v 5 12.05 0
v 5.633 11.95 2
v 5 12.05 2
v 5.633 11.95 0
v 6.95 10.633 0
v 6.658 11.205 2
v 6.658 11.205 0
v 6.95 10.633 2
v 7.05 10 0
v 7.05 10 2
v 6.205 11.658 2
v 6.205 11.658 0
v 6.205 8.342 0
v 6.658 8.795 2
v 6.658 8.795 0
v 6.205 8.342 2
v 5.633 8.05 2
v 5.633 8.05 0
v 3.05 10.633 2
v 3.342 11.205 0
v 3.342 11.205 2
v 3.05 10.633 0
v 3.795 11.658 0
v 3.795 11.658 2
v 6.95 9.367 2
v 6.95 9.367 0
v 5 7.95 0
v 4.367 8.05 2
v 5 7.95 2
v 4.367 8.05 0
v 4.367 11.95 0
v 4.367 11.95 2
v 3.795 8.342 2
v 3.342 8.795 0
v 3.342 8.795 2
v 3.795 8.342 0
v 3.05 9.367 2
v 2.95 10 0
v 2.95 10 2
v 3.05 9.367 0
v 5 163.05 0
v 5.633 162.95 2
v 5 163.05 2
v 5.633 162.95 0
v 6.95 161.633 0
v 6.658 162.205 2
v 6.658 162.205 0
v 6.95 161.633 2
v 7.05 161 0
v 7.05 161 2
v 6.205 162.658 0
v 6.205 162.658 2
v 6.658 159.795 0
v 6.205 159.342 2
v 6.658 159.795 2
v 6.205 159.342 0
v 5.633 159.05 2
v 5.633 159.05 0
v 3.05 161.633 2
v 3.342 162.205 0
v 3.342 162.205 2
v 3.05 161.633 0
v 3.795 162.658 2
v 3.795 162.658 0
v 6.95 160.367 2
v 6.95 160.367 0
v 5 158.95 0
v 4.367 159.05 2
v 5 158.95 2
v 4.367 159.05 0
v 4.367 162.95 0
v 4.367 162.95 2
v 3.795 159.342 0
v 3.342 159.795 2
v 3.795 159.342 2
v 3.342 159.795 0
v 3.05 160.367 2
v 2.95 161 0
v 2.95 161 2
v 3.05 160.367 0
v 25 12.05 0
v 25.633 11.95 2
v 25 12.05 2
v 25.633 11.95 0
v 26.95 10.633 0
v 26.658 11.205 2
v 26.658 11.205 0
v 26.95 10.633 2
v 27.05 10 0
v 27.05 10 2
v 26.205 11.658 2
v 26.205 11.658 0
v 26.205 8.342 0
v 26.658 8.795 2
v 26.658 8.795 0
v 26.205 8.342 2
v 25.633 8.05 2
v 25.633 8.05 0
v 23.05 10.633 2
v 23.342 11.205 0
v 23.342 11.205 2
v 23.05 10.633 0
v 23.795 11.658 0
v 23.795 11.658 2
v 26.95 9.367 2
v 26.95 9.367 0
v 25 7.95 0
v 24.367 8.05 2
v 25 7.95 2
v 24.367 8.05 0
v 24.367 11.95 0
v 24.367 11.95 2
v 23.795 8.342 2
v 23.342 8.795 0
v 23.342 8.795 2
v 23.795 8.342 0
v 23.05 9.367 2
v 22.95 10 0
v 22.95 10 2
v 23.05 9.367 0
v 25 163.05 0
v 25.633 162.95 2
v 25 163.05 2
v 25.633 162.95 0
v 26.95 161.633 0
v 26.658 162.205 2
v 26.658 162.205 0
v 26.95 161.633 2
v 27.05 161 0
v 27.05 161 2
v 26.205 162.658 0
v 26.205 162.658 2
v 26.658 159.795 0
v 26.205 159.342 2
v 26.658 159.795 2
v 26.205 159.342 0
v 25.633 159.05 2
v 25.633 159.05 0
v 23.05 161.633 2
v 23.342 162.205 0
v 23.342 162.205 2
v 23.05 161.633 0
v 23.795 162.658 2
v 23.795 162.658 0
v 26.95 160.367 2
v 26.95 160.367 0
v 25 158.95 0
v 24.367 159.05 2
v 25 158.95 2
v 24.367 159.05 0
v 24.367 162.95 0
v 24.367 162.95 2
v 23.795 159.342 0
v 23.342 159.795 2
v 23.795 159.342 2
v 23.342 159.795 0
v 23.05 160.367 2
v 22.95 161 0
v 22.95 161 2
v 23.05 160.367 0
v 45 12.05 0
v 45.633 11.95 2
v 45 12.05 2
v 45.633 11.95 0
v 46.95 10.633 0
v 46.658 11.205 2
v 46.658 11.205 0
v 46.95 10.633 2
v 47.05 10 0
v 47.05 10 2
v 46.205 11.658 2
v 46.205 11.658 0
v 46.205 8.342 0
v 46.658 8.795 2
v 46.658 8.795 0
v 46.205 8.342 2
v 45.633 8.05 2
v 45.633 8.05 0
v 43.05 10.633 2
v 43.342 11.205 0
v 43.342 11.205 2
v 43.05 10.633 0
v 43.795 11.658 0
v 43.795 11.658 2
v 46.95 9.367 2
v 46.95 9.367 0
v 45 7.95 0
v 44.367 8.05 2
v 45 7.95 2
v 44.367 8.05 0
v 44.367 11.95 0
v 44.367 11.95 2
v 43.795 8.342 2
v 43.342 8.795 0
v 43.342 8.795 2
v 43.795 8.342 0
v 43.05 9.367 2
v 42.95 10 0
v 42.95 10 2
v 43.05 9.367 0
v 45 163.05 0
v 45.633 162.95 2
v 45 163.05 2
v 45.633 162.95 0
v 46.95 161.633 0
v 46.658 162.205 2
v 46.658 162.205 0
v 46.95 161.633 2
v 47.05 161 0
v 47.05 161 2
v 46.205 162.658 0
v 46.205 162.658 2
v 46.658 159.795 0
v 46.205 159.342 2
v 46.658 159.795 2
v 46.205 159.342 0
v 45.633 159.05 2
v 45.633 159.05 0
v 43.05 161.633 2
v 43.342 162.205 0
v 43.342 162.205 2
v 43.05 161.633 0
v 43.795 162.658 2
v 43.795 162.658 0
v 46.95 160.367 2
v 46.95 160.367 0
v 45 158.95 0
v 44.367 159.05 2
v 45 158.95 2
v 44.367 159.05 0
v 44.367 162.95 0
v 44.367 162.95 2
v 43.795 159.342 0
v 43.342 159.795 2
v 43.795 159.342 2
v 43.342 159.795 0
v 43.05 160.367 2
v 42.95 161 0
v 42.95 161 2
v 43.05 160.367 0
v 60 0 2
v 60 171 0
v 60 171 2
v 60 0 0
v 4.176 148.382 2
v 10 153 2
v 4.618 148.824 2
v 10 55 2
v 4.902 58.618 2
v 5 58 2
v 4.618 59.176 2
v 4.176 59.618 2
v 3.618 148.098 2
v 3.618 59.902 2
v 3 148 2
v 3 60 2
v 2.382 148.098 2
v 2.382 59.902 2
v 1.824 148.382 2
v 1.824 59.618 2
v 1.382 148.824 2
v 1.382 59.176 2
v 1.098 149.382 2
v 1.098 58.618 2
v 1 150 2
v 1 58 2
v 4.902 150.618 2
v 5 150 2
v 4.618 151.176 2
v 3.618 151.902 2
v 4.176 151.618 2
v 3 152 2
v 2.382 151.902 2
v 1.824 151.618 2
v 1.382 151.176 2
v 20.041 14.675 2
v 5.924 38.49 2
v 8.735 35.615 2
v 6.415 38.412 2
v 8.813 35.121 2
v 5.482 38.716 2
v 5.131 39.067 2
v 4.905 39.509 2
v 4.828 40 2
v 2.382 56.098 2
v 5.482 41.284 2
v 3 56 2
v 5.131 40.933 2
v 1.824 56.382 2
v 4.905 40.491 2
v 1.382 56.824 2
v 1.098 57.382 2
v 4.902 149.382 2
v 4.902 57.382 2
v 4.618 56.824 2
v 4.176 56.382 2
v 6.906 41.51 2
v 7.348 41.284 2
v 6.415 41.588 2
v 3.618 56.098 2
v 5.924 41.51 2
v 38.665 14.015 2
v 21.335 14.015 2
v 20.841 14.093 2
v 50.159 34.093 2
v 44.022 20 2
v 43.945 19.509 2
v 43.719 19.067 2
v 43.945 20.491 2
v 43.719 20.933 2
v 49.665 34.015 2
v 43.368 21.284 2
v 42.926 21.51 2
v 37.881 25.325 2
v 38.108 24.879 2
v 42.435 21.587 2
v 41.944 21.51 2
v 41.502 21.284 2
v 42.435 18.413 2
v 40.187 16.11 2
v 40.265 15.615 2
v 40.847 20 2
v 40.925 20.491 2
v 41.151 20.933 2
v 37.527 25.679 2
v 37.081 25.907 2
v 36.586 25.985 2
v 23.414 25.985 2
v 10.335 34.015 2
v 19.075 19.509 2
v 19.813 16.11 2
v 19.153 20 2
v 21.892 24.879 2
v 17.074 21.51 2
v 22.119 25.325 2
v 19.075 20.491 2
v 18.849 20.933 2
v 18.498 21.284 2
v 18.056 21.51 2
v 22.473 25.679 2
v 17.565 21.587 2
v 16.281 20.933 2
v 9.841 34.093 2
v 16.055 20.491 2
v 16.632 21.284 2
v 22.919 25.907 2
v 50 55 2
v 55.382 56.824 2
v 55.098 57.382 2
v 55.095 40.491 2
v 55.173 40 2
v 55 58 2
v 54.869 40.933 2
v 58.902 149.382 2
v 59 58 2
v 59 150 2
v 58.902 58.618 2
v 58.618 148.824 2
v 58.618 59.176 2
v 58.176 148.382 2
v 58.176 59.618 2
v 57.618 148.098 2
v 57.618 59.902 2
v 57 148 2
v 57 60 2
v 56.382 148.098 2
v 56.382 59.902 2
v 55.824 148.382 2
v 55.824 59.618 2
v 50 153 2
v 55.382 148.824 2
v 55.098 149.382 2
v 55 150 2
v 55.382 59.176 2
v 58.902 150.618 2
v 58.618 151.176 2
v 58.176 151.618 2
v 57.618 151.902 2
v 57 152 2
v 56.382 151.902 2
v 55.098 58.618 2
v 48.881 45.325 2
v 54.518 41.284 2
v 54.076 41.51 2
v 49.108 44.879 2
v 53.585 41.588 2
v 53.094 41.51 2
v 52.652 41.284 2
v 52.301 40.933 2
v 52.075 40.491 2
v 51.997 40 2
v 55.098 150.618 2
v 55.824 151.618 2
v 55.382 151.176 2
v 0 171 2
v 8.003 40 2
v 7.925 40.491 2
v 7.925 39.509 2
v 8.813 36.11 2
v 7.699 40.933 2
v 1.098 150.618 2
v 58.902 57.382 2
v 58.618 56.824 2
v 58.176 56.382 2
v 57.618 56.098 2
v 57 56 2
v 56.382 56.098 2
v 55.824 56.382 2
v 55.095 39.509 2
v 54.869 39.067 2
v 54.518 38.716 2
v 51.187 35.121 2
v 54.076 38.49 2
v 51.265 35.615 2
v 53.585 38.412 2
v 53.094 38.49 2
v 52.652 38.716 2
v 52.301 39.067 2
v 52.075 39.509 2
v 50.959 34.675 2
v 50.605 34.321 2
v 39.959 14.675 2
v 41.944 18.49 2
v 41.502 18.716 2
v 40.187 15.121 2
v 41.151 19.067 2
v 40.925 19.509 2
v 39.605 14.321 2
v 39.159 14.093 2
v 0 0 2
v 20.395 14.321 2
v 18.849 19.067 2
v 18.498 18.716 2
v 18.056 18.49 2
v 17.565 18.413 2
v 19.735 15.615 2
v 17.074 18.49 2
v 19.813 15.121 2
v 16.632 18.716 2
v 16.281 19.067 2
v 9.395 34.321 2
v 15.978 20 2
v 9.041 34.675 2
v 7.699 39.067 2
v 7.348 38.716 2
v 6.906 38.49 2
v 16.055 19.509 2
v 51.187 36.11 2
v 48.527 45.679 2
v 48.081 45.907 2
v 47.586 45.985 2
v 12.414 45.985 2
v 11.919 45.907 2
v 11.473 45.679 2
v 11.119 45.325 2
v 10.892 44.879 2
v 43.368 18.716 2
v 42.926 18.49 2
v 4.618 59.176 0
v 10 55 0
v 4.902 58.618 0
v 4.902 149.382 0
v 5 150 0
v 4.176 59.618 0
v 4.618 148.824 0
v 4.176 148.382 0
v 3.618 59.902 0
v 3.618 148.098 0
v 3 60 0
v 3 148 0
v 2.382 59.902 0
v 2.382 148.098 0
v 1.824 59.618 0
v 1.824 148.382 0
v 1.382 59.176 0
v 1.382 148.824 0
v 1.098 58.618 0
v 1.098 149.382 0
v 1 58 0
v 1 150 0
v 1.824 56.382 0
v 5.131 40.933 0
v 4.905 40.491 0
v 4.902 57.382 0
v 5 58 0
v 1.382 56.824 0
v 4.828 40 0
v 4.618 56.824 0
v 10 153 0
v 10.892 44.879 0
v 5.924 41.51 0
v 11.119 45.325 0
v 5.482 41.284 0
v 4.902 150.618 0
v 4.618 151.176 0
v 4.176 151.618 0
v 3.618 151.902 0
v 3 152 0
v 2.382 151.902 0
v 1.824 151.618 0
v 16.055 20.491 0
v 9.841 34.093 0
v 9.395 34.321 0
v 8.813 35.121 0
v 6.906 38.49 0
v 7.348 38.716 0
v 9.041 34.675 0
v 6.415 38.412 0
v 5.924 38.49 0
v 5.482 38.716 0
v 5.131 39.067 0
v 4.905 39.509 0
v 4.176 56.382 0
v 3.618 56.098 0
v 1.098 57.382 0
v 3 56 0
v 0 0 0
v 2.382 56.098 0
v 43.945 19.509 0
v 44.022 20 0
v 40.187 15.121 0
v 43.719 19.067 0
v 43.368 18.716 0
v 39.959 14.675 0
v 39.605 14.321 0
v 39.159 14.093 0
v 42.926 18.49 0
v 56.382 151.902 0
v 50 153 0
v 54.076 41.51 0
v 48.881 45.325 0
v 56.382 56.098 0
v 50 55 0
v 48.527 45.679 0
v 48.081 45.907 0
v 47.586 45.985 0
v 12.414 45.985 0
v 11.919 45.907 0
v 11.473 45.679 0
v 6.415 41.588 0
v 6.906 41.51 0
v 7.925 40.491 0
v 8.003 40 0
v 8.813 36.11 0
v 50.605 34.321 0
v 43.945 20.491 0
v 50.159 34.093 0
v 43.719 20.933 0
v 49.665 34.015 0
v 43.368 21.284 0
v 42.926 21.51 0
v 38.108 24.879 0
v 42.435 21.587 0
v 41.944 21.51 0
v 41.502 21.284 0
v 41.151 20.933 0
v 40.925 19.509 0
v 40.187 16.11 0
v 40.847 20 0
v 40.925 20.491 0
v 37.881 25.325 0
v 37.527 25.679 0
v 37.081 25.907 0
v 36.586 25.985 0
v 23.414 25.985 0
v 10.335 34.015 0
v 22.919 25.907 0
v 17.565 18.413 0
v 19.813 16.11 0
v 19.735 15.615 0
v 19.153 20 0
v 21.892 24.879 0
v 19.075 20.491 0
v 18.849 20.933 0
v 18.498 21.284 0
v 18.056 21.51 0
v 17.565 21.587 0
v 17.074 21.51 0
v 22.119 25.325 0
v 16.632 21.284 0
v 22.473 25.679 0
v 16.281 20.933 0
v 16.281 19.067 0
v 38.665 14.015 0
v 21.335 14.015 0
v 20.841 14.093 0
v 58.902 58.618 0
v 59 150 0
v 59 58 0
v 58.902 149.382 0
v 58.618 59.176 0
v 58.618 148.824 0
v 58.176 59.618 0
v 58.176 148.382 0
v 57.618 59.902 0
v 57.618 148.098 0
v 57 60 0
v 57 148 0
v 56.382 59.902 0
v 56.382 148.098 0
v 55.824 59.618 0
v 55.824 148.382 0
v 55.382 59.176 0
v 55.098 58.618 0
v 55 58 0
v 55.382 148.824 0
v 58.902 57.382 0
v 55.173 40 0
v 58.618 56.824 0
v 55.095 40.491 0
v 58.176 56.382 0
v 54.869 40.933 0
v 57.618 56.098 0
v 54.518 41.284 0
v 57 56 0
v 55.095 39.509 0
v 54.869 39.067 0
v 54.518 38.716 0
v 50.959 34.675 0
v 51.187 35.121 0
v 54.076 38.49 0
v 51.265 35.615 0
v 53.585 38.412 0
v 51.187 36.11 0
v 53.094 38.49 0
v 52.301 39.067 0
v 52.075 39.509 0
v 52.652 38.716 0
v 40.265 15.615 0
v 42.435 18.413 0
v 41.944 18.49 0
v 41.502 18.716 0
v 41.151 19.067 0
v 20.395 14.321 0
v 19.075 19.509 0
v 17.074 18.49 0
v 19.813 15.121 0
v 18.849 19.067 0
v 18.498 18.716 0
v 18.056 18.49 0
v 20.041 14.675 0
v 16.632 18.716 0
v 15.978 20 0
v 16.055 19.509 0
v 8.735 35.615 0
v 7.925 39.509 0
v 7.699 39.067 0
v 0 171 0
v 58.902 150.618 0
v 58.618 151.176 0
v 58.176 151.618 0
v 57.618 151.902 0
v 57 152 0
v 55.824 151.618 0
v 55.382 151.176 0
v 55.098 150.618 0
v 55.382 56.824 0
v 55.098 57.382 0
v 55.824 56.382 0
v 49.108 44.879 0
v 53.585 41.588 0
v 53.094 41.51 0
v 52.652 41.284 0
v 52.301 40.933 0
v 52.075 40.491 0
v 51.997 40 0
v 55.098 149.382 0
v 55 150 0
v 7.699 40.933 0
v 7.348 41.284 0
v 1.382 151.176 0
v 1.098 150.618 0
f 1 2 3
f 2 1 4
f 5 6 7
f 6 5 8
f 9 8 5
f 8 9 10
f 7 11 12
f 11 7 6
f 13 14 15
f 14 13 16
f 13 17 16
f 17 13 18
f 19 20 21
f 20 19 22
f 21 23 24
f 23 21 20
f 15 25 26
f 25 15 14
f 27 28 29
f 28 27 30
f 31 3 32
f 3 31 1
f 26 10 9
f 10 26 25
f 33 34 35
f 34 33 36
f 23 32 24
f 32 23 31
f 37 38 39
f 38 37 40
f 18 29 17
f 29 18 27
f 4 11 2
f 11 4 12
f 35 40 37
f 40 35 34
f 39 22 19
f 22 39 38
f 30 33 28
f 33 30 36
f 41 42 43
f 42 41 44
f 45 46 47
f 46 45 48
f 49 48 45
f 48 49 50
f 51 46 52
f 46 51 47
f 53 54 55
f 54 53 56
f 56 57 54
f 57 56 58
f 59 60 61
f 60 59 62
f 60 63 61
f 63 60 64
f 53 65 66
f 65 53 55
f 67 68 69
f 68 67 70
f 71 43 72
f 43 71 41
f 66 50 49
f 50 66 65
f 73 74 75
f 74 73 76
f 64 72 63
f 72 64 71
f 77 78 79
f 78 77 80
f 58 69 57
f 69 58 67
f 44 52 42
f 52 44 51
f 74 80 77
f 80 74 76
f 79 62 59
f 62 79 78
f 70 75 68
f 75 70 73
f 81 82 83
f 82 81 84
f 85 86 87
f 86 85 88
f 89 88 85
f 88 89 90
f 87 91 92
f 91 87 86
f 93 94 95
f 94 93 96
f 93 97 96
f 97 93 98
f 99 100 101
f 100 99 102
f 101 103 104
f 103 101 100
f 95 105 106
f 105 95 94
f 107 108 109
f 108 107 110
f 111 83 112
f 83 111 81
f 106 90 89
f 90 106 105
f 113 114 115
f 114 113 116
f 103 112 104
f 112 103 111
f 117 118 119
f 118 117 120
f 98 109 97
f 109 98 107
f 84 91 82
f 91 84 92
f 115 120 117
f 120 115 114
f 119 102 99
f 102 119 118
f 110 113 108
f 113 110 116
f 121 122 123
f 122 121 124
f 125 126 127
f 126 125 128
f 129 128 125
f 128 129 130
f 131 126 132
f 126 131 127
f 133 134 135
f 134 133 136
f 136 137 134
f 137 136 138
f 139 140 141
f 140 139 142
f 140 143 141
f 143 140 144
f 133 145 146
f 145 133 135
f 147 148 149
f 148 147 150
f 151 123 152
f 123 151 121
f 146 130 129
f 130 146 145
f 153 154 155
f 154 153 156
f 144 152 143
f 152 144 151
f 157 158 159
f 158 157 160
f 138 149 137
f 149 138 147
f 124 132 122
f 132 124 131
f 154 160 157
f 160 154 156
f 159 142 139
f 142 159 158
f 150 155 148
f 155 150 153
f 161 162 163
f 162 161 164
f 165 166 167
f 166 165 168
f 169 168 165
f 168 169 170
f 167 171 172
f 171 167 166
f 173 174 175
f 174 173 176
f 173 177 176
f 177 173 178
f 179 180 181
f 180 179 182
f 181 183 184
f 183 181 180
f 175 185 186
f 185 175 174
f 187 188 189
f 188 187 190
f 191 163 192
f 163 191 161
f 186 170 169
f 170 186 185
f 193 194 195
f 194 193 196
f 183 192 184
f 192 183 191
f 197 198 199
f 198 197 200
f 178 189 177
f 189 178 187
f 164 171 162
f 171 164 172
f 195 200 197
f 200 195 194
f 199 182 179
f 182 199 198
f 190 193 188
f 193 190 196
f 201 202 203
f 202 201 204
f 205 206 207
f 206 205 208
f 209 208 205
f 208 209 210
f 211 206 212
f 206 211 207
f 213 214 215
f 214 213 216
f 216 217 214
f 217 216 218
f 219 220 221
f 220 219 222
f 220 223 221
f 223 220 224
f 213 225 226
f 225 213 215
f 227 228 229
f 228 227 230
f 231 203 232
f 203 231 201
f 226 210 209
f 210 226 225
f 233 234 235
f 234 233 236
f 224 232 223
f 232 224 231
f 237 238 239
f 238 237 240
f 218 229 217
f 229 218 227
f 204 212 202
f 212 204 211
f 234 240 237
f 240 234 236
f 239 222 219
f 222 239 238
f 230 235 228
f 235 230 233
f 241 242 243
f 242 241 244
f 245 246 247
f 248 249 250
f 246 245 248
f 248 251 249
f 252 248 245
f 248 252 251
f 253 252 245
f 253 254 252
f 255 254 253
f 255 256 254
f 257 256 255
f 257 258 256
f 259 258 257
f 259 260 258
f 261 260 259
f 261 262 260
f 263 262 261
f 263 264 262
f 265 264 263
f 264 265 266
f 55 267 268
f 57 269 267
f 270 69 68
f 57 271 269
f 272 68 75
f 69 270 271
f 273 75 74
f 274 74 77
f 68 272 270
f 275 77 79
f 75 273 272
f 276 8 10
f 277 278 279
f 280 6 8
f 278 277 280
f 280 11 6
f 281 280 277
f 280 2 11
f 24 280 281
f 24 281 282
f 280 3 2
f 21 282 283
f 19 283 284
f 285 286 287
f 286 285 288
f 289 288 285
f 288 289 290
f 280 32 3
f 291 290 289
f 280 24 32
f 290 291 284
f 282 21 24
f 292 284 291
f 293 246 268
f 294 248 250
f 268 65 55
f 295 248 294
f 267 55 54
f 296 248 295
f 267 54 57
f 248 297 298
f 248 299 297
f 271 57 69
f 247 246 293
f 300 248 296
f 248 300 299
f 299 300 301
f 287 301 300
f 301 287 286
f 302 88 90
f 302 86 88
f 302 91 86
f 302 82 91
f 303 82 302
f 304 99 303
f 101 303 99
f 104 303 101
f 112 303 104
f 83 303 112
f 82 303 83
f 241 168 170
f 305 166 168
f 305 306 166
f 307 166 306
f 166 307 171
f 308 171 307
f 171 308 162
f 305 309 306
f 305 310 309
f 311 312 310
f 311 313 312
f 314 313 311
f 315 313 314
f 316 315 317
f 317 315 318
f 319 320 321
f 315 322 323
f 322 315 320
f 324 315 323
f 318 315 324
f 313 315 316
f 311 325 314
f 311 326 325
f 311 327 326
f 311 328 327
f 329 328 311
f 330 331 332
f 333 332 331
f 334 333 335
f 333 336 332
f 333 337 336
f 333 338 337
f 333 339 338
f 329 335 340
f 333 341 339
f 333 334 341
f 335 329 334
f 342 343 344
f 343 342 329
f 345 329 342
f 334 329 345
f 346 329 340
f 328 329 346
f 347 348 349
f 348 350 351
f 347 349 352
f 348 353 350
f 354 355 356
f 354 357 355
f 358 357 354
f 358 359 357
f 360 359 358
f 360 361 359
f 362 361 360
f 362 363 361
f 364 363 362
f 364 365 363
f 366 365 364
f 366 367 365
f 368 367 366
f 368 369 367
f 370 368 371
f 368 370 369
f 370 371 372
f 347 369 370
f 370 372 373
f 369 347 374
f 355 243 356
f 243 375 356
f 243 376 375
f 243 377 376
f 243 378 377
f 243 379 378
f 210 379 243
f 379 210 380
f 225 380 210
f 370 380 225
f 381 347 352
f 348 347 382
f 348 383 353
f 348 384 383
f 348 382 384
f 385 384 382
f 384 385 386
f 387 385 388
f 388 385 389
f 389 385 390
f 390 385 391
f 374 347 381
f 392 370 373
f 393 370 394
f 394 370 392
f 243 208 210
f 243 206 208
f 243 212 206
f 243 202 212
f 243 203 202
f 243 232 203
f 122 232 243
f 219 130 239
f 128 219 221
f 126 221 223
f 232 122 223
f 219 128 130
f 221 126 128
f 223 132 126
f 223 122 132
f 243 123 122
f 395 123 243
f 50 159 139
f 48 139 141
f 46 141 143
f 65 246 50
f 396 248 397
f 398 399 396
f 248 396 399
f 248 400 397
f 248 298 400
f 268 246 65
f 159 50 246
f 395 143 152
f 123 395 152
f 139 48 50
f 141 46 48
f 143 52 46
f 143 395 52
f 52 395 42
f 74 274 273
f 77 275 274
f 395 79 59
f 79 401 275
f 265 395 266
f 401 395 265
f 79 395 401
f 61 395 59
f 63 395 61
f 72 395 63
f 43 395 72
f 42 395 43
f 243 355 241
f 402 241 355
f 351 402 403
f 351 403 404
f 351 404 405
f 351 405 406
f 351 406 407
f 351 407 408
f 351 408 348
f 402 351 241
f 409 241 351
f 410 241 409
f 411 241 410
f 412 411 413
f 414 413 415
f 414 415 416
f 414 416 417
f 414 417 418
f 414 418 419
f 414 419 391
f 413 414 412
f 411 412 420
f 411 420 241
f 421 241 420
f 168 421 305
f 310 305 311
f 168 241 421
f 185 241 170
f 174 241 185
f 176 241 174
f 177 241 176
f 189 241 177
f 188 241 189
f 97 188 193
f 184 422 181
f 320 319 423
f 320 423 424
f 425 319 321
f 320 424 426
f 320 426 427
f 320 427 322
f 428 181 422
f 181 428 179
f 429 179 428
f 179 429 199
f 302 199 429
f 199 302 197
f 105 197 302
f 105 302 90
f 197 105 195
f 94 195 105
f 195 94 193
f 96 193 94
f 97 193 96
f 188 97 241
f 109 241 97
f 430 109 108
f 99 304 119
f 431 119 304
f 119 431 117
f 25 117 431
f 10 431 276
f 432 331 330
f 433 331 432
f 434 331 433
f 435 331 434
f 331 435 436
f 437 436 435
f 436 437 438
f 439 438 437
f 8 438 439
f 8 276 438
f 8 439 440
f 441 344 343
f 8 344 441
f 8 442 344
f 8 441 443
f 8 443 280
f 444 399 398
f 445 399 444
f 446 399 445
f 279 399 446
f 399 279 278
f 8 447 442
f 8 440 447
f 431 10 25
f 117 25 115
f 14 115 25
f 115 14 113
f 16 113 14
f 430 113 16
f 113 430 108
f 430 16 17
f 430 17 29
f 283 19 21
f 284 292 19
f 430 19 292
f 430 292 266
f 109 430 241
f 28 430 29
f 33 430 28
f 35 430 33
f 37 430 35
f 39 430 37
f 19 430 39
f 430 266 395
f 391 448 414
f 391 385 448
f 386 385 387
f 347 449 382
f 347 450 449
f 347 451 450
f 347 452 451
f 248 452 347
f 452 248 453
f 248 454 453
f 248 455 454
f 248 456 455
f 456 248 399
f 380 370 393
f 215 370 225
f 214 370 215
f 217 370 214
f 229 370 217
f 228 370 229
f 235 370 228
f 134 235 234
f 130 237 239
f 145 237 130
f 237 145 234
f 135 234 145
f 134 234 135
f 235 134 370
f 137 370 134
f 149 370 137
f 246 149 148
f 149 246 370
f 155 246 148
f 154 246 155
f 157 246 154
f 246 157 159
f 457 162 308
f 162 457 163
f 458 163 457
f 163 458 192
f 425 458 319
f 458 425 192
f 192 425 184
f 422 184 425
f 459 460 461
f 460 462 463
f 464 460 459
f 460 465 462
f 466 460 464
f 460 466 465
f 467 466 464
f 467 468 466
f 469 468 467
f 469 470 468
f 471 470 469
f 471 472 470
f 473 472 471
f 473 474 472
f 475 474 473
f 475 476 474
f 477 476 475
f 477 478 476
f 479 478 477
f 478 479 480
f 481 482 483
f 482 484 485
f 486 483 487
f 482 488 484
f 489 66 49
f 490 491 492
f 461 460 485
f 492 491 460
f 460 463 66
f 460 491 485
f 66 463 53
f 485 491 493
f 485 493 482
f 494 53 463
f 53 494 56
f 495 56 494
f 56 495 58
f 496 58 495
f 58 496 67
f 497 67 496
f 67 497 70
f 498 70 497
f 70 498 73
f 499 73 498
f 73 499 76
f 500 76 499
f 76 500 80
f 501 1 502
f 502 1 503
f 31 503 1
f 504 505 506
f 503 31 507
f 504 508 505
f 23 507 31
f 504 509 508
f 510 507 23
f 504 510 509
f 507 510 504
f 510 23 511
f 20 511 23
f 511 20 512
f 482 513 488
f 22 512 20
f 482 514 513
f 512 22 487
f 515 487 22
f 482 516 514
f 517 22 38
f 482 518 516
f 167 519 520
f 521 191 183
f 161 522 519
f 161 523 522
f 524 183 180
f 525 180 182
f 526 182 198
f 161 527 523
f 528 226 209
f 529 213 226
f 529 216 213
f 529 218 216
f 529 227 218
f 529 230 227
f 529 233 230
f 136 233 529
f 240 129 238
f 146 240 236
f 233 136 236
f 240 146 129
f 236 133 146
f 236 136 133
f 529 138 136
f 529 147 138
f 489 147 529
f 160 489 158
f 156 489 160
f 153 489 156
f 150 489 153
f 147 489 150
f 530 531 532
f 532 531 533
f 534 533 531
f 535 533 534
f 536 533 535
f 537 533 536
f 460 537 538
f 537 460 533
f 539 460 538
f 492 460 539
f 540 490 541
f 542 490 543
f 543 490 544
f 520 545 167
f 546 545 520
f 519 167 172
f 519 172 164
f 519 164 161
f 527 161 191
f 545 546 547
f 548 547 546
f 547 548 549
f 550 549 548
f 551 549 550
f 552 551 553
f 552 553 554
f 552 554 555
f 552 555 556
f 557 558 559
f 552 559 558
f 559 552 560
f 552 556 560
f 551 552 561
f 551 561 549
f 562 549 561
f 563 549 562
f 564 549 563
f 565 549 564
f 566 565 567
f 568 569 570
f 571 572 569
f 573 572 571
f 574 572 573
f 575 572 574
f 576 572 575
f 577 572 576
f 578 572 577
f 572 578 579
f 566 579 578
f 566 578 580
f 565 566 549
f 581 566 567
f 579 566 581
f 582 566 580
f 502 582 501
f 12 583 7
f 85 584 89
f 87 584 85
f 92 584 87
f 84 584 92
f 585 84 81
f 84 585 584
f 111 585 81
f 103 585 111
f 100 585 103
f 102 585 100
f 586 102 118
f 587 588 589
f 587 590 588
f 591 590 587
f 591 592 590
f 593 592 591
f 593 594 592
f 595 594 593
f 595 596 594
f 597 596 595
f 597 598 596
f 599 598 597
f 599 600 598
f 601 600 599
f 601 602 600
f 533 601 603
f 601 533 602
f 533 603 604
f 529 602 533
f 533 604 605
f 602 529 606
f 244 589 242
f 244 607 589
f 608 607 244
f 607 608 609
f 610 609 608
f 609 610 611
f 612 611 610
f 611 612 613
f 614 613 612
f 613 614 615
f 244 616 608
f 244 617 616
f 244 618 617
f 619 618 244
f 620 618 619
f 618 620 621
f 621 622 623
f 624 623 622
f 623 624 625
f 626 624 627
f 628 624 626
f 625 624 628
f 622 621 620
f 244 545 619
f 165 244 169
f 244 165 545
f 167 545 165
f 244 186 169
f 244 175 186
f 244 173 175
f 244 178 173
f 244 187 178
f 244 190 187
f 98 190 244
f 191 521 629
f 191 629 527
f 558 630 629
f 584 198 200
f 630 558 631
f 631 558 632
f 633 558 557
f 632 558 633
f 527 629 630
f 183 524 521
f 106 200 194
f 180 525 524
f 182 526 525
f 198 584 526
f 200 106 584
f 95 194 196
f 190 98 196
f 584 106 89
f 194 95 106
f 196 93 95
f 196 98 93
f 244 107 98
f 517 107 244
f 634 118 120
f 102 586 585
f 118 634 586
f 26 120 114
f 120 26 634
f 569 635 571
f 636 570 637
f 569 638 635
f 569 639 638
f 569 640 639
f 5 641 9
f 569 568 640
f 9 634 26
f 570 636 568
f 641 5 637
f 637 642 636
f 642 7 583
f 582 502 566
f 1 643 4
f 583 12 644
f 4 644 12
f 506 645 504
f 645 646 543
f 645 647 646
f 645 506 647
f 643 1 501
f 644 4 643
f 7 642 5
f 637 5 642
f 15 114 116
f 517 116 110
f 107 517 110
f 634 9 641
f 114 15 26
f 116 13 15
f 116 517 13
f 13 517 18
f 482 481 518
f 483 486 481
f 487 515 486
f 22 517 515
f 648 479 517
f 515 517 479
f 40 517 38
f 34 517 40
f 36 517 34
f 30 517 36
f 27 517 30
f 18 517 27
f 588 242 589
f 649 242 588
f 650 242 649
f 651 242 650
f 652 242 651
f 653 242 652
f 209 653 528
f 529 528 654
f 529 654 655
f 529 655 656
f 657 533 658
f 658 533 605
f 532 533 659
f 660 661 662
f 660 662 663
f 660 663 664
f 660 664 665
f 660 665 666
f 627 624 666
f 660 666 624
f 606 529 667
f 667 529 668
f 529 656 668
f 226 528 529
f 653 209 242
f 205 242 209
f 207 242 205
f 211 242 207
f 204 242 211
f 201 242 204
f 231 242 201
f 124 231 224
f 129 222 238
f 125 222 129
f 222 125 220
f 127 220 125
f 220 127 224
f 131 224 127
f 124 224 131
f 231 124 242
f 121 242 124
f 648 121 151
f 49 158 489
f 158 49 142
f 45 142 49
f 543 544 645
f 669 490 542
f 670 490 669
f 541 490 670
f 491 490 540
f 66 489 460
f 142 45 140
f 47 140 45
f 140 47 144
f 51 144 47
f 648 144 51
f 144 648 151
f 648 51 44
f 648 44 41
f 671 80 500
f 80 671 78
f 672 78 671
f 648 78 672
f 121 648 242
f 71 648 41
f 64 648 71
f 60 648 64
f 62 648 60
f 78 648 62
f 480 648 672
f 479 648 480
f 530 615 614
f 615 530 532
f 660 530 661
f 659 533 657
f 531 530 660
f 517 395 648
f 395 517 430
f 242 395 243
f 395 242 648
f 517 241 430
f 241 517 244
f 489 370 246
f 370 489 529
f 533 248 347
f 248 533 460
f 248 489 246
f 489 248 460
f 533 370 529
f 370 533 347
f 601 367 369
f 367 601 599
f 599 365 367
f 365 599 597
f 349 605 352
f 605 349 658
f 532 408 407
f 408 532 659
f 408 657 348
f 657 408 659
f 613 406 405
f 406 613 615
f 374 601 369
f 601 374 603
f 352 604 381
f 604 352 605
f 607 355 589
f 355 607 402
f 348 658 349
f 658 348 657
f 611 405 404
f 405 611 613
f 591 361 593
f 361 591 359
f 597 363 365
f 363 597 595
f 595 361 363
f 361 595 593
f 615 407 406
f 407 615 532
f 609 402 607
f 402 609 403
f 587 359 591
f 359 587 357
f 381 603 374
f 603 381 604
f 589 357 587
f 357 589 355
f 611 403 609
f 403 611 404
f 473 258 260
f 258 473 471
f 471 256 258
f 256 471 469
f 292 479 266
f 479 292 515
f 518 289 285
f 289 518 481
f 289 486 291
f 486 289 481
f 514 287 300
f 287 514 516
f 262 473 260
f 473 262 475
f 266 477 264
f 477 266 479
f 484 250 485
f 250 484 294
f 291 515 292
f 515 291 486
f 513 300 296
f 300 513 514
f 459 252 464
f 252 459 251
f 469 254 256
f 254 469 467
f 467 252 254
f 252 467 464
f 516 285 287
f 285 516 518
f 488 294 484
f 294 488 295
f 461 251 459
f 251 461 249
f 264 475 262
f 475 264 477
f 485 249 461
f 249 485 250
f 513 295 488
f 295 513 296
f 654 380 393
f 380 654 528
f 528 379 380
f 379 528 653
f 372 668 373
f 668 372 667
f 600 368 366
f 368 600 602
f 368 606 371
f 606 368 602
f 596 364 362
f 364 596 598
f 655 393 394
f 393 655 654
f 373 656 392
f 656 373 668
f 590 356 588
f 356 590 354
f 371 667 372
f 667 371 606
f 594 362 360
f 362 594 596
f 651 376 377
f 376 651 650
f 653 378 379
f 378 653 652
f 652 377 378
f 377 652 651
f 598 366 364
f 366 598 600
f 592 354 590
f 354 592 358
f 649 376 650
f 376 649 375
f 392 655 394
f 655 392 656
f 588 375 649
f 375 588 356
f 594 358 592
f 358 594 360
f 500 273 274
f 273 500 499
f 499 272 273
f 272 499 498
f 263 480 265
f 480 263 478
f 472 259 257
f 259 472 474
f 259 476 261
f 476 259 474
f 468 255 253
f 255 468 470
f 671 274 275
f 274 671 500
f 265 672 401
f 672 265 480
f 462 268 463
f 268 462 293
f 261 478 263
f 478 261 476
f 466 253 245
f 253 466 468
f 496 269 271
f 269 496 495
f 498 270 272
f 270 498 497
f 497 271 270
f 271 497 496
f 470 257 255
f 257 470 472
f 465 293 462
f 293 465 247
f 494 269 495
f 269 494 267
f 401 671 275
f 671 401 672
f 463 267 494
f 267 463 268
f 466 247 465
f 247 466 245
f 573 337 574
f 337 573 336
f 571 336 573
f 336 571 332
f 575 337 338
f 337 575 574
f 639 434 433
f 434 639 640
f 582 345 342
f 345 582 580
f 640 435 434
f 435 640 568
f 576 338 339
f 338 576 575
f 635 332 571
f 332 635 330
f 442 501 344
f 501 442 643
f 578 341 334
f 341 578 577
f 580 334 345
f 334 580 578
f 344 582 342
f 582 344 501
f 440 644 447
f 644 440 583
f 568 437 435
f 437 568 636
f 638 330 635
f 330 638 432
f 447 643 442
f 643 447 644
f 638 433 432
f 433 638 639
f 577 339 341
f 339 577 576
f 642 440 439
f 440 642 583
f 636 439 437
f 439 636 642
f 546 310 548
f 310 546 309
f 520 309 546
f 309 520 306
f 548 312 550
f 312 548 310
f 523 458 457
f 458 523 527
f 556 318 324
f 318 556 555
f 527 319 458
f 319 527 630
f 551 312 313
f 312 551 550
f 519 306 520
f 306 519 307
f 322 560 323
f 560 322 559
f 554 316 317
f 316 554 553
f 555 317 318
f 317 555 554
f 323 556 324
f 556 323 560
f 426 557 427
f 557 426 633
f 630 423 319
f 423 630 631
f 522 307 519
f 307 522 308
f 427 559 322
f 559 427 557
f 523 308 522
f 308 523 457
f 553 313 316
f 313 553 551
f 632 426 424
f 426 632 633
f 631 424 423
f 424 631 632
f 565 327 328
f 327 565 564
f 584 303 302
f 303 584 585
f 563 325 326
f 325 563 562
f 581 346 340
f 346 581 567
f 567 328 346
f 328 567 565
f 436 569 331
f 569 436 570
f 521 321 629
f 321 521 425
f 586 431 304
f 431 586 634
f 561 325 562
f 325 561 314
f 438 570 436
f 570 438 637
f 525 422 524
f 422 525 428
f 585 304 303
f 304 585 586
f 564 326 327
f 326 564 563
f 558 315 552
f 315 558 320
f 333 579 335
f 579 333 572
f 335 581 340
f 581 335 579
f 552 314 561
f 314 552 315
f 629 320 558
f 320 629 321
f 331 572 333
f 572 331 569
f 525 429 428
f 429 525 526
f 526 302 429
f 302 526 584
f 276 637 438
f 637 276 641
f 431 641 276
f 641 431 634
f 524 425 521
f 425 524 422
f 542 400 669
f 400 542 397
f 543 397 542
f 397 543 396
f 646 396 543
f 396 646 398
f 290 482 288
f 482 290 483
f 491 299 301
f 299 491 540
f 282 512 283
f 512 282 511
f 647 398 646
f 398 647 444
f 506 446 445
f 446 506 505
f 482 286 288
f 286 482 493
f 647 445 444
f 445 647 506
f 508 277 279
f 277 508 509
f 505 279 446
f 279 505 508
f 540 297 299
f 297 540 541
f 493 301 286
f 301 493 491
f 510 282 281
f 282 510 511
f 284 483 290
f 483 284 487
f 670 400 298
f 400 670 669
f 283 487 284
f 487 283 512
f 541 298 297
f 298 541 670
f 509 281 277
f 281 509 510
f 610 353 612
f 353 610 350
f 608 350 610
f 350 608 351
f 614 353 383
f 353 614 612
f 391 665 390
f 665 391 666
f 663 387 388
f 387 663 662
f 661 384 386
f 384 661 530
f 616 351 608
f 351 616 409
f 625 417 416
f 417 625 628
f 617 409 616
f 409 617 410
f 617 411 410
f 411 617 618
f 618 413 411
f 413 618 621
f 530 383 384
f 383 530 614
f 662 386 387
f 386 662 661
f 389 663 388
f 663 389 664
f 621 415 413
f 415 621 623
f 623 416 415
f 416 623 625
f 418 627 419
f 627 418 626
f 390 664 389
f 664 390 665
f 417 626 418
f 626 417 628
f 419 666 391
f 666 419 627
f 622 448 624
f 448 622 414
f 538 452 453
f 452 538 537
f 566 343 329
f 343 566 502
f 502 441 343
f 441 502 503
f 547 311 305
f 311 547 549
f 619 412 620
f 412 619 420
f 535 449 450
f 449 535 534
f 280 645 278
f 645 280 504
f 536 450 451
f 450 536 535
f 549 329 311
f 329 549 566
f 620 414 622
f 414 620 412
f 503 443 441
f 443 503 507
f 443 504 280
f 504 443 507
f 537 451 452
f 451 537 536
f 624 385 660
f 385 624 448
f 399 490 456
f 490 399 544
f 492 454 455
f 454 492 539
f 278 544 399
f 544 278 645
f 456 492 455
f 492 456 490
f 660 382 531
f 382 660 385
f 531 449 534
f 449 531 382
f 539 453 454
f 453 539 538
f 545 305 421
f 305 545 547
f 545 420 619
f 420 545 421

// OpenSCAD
// file: bbs_tray.scad
//
// Basic sliding tray to mount in a rack.  Varients of this tray can
// hold different electronic devices.
//
use <bbs_shapes.scad>
length=200;
width=160;
//module prism(l)
//{
//    linear_extrude(height=l) polygon([[0,0], [0,5], [2.5,2.5]]);
//}
module bbs_tray()
{
    difference()
    {
        union()
        {
            cube([length, width, 3], center=false); // Base
            translate([0, 0, 6])rotate([0, 90, 0]) rotate([0, 0, -90]) bbs_prism1(5, length); // Rail
            translate([0, width, 1])rotate([0, 90, 0]) rotate([0, 0, 90]) bbs_prism1(5, length); // Rail
            translate([0, 0, 0]) cube([length, 8, 7], center=false); // Side
            translate([0, width - 8, 0]) cube([length, 8, 7], center=false); // Side
//
            translate([length, 3, 4]) rotate([0, 90, 0]) cylinder($fn=12, h=5, r=3);
            translate([length + 5, 0, 0]) cube([5, 8, 8], center=false); // Knob
            translate([length, width - 4, 4]) rotate([0, 90, 0]) cylinder($fn=12, h=5, r=3);
            translate([length + 5, width - 8, 0]) cube([5, 8, 8], center=false); // Knob
        }
        union()
        {
        }
    }
}

bbs_tray();
// file: bbs_pins.scad
//
// A pin header with 0.1 inch spacing
//
pitch = 2.54;

module bbs_header(pins)
{
    for (i = [1 : pins])
    {
        translate([(i-1)*pitch, 0, -9]) cylinder(h=11.57, r=0.5);
        translate([(i-1)*pitch, 0, -9 + 5.93]) cylinder(h=2.27, r=1.5);
    }
}

bbs_header(10);
// file: bbs_rack.scad
//
// Extendable rack for trays
//

use <bbs_shapes.scad>
use <bbs_tray.scad>
use <bbs_panel.scad>

//height = 115;
width = 161;
length = 200;
screw = 4.1/2;

module bbs_rack(frames)
{
    $fn=20;
    height = (frames+1)*20 + 15;
    rail_offset = 3;
    difference()
    {
        union()
        {
            //
            // Frame
            //
            cube([5, 170, 5]);
            cube([length, 5, 12 + rail_offset]);
            cube([5, 5, height]);
            translate([0, width + 5, 0]) cube([length, 5, 12 + rail_offset]);
            translate([0, width + 5, 0]) cube([5, 5, height]);
            translate([length - 5, 0, 0]) cube([5, width + 10, 3.5]);
            translate([length - 5, 0, 0]) cube([5, 5, height]);
            translate([length - 5, width + 5, 0]) cube([5, 5, height]);
            translate([0, 0, height + 5]) rotate([0, 90, 0]) bbs_prism2(10, length);
            translate([0, width + 10, height + 5]) rotate([270, 0, 0]) rotate([0, 90, 0]) bbs_prism2(10, length);
            //
            // Flanges
            //
            translate([0, 5, 5]) cube([2, 10, height]);
            translate([0, width - 5, 5]) cube([2, 10, height]);
            translate([length - 2, 5, 15 + rail_offset]) cube([2, 10, height - 10 - rail_offset]);
            translate([length - 2, width - 5, 15 + rail_offset]) cube([2, 10, height - 10 - rail_offset]);
            translate([5, 0, 12]) cube([length - 5, 2, height - 10]);
            translate([5, width + 8, 12]) cube([length - 5, 2, height - 10]);
            //
            translate([5, 5, 0]) cube([length - 10, 10, 2]);
            translate([5, width - 5, 0]) cube([length - 10, 10, 2]);
            translate([0, 5, height + 3]) cube([length, 10, 2]);
            translate([0, width - 5, height + 3]) cube([length, 10, 2]);
            //
            // Some bevels on the top flanges this improves printing the top flanges.
            //
            translate([0, 5, height + 1 ]) rotate([11, 0, 0]) cube([length, 10, 2]);
            translate([0, width - 5, height + 3]) rotate([-11, 0, 0]) cube([length, 10, 2]);
            //
            // Other little bits and pieces mostly for support
            //
            translate([length - 2, 5, 15 + rail_offset]) rotate([0, 0, 0]) rotate([0, 90, 0]) bbs_prism2(4, 2);
            translate([length - 2, width + 5, 15 + rail_offset]) rotate([270, 0, 0]) rotate([0, 90, 0]) bbs_prism2(4, 2);
            for(a = [30:20:length - 30])
            {
                translate([a, 0, height + 3]) rotate([0, 90, 0]) bbs_prism2(15, 2);
                translate([a, width + 10, height + 3]) rotate([270, 0, 0]) rotate([0, 90, 0]) bbs_prism2(15, 2);
            }
        }
        //
        // Parts describing things to be removed
        //
        union()
        {
            //
            // Slides fpr rails
            //
            translate([2, 5.01, 11 + rail_offset]) rotate([0, 90, 0]) rotate([0, 0, -90]) bbs_prism1(5.02, length);
            translate([2, width + 4.99, 6 + rail_offset]) rotate([0, 90, 0]) rotate([0, 0, 90]) bbs_prism1(5.02, length);
            //
            // Mounting screw holes - horizontal
            //
            for(a = [20 + rail_offset:20:height])
            {
                translate([10, -1, a]) rotate([-90, 0, 0]) cylinder(r=screw, h=width+20);
                translate([length -10, -1, a]) rotate([-90, 0, 0]) cylinder(r=screw, h=width+20);
                translate([-1, 10, a]) rotate([0, 90, 0]) cylinder(r=screw, h=length+20);
                translate([-1, width, a]) rotate([0, 90, 0]) cylinder(r=screw, h=length+20);
            }
            //
            // Mounting screw holes - vertical
            //
            for(a = [20:20:length-10])
            {
                translate([a, 10, -1]) cylinder(r=screw, h=height + 20);
                translate([a, width , -1]) cylinder(r=screw, h=height + 20);
            }
            //
            // Side vents
            //
            for(a = [20:20:length-20])
            {
                translate([a, -1, 17 + rail_offset]) rotate([-90, 0, 0]) hull() 
                {
                    translate([0, -3, 0]) cylinder(r=7.5, h=width + 20);
                    translate([0, -(height - 25 - rail_offset), 0]) cylinder(r=5, h=width + 20);
                }
            }
            //
            // Round off a couple corners
            //
            translate([length - 2.5, 15.01, 14.99 + rail_offset]) rotate([180, 0, 0]) rotate([0, 90, 0])bbs_fillet(5, 3);
            translate([length - 2.5, width - 5.01, 14.99 + rail_offset]) rotate([90, 0, 0])rotate([0, 90, 0]) bbs_fillet(5, 3);
        }
    }
}

union()
{
    bbs_rack(2);
//    translate([1, 5, 5 + 3]) color("red") bbs_tray();
//    translate([length + 2, 0, 18])rotate([0, 270, 0]) color("blue") bbs_panel(2);
}
// file: bbs_shapes.scad
//
// This is a catalogu of shapes that are used in other structures.  Each shape is
// parameterized to make them more flexible.
//
//===================================
// Triangular prism type 1.  This takes the form of an isosolese right triangle.
// The triangle is oriented with the hypotonuse in the y direction.  Extrusion is in the
// z direction.  Origin is at one end of the hypotonuse.
//
// Parameters
// s - size of triangle (length of hypotonuse)
// l - length of prism
//
module bbs_prism1(s, l)
{
    linear_extrude(height=l) polygon([[0, 0], [0, s], [s/2, s/2]]);
}
//
//===================================
// Triangular prism type 2.  This takes the form of an isosolese right triangle.
// The triangle is oriented with the right angle at the origin.  Extrusion is in the
// z direction.
//
// Parameters
// s - size of triangle (length of sides)
// l - length of prism
//
module bbs_prism2(s, l)
{
    linear_extrude(height=l) polygon([[0, 0], [0, s], [s, 0]]);
}
//
//===================================
// Fillet.  This is a square with a circle removed from it.  The circle
// has a radius equal to the square's sides and is positioned at one of the corners.  The
// length is in the z  direction.
//
// Parameters
// s - size of fillet
// l - length of extrusion
//
module bbs_fillet(s, l)
{
    difference()
    {
        cube([s, s, l]);
        translate([s, s, -0.1]) cylinder(r=s, h=l+0.2);
    }
}
//
//===================================
// Spacer.  This is a cylinder with a cylinder removed from the center of it.  It
// would typically be used to around a bolt to add some space like a standoff or
// as a washer.
//
// Parameters
// od - outside diameter
// id - inside diameter
// height - height
//
module bbs_spacer(od, id, height)
{
    difference()
    {
        cylinder(r=od/2, h=height);
        translate([0, 0, -0.1]) cylinder(r=id/2, h=height + 0.2);
    }
}
//
// Examples
//
//bbs_prism1(3, 5);
//translate([0, 7, 0]) bbs_prism2(3, 5);
//translate([7, 0, 0]) bbs_fillet(3, 5);
bbs_spacer(23, 10, 16);
// file: bbs_lcd_20x4.scad
use <bbs_pins.scad>
//
// Model for a 20x4 LCD
// AdaFruit item #198
//
module bbs_20x4_lcd()
{
  difference()
  {
    union()
    {
      cube([98, 60, 2], center=false);
      translate([0, 10, 0]) cube([98, 40, 11]);
      translate([49, 3, ]) bbs_header(16);;
    }
    union()
    {
      translate([3, 3, -1]) cylinder(h=4, r=2);
      translate([3, 57, -1]) cylinder(h=4, r=2);
      translate([95, 3, -1]) cylinder(h=4, r=2);
      translate([95, 57, -1]) cylinder(h=4, r=2);
    }
  }
}

module bbs_20x4_lcd_cutouts(height, facets)
{
    union()
    {
      translate([0, 10, 0]) cube([98, 40, height]);
      translate([3, 3, 0]) cylinder(h=height, r=2, $fn=facets);
      translate([3, 57, 0]) cylinder(h=height, r=2, $fn=facets);
      translate([95, 3, 0]) cylinder(h=height, r=2, $fn=facets);
      translate([95, 57, 0]) cylinder(h=height, r=2, $fn=facets);
    }
}

bbs_20x4_lcd();
translate([0, 0, -2]) color("red") bbs_20x4_lcd_cutouts(2, 20);
// file: bbs_switches.scad
//
// Model for a SPDT switch from AdaFruit (Product ID 3221)
//
// The switch module can be used for checking for interferance.
// The cutout module is to be used for making a hole for mounting the switch in a panel.
//

module bbs_spdt_switch()
{
    translate([-13/2, -7.88/2, -9.56]) difference()
    {
        union()
        {
            cube([13, 7.88, 9.56]);
            translate([1.59, 2.17, -3.75]) cube([0.73, 7.88-2.17*2, 3.75]);
            translate([6.5, 2.17, -3.75]) cube([0.73, 7.88-2.17*2, 3.75]);
            translate([11.09, 2.17, -3.75]) cube([0.73, 7.88-2.17*2, 3.75]);
            translate([13/2, 7.88/2, 9.56]) cylinder(h=8.79, r=5.72/2);
            translate([13/2, 7.88/2, 9.56 + 1]) cylinder(h=0.65, r=11.97/2);
            translate([13/2, 7.88/2, 9.56+8.79]) cylinder(h=9.86, r=2.95/2);
        }
        union()
        {
            translate([13.2/2-5.72/2, 7.88/2-0.55/2, 9.56]) cube([0.1, .55, 8.79]);
        }
    }
}

module bbs_spdt_switch_cutout(height)
{
    difference()
    {
        translate([0, 0, -1.0]) cylinder(h=height + 1, r=5.75/2 + 0.1, $fn=20);
        translate([-5.75/2 - 0.2, -0.55/2, -2.0]) cube([0.3, 0.55/2, height + 4]);
    }
}

//bbs_spdt_switch();
bbs_spdt_switch_cutout(2);
// file: bbs_leds.scad
//
// Mounts for LEDs.  The modules are parameterized based on the diameter of the LED.
// Since the LEDs don't have mounting hardware, they are just friction fit.
//
// Parameters:
// diameter - the diameter of the LED in mm
// height - the hight (thickness) in mm
//

module bbs_led_mount(diameter, height)
{
    difference()
    {
        union()
        {
            cylinder(h=height, r=diameter/2 + 1);
            translate([-diameter/2 - 2, -2, 0]) cube([2, 4, height]);
        }
        union()
        {
            translate([0, 0, -0.5]) cylinder(h=height + 1, r=diameter/2 - 0.2, $fn=20);
            translate([0.0, -0.5, -0.5]) cube([diameter/2+1.2, 1.0, height + 1]);
        }
    }
}

module bbs_led_cutout(diameter, height)
{
    translate([0, 0, -0.5]) cylinder(h=height + 1, r=diameter/2 + 2);
}

bbs_led_mount(5, 2);
translate([0, 0, -1]) color("red") bbs_led_cutout(5, 2);
// file: bbs_connectors.scad
//
// This is a collection of connector cutouts for panels.
//
// Dimensions for D-Sub connectors from http://www.interfacebus.com/Connector_D-Sub_Mechanical_Dimensions.html
// Since the cutouts are intended for either gender connector and since 3-D printer holes tend to be a little
// smaller than specified, the maximum tolerance sizes are used.  These may be tweaked if they turn out to
// still be a little too small.
//
// The coordinate origin is at the center of the connector.
//
// The dimensions of interest are:
// C - Distance between mounting holes.  The connector is assumed to be centered between them
// H - Horizontal size of cutout
// J - Vertical size of cutout
//
// Other dimensions that don't depend on the specific connector:
// Corner radius - 0.062 inches
// Screw hole size - 0.125 inches
//
// Dimension table
// Size   C      H      J
//   1  24.87  19.53  10.97
//   2  33.45  27.76  10.97
//   3  47.17  41.53  10.97
//   4  63.63  57.96  10.97
//   5  61.24  55.58  13.82
//   6  63.63  58.72  15.39
//
// Pins per connector
// Size  Standard  Dense
//    1     9        15
//    2    15        26
//    3    25        44
//    4    37        62
//    5    50        78
//    6   104       n/a
//
module bbs_d_cutout(size, height)
{
    if ((size < 1) || (size > 6))
    {
        echo("bbs_connectors.scad Invalid size given for D-sub connector ", size);
//        assert(false); // Assert may not be supported yet
    }
    screw_rad = 0.125 * 25.4/2;
    corner_rad = 0.063 * 25.4;
    c_sizes = [24.87, 33.45, 47.17, 63.63, 61.24, 63.63];
    h_sizes = [19.53, 27.76, 41.53, 57.96, 55.59, 58.72];
    j_sizes = [10.97, 10.97, 10.97, 10.97, 13.82, 15.39];
    size_c = c_sizes[size - 1];
    size_h = h_sizes[size - 1] + 1.0;
    size_j = j_sizes[size - 1] + 1.0;
    union()
    {
        translate([-size_c/2, 0, 0]) cylinder(r = screw_rad, h = height, $fn=20);
        translate([size_c/2, 0, 0]) cylinder(r = screw_rad, h = height, $fn=20);
        minkowski()
        {
            linear_extrude(height = height/2)
                polygon(points=[[-size_h/2+corner_rad, -size_j/2+corner_rad],
                    [size_h/2-corner_rad, -size_j/2+corner_rad], 
                    [size_h/2-corner_rad-sin(10)*size_j, size_j/2-corner_rad],
                    [-size_h/2+corner_rad+sin(10)*size_j, size_j/2-corner_rad]]);
            cylinder(r=corner_rad, h=height/2, $fn=20);
        }
    }
}

bbs_d_cutout(1, 2);
// file: bbs_panel.scad
//
// Panel for rack.  This can screw on to the front or back of a rack.  This is a basic
// blank panel.  It can be modified with cutouts for any assortment of switches, LEDs,
// LCDs, connectors, and whatever else you can think of.  The height of the panel is
// measured in frames, which is the number of screw holes spaced 20mm apart.
//

use <bbs_shapes.scad>
use <bbs_rack.scad>

module bbs_panel(frames)
{
    $fn = 20;
    length = frames *20;
    width = 161;
    height = 2;
    screw = 4.1/2;
    difference()
    {
        cube([length, width + 10, height]);
        union()
        {
            for(a = [5:20:length-10])
            {
                translate([a, 10, -1]) cylinder(r=screw, h=height + 2);
                translate([a, width, -1]) cylinder(r=screw, h=height + 2);
            }
        }
    }
}

bbs_panel(2);
// main file
//
// This is an example of a panel.  I am using to test various of the cutouts and
// other panel related things.
//
use <bbs_panel.scad>
use <bbs_connectors.scad>
use <bbs_leds.scad>
use <bbs_switches.scad>
use <bbs_lcd_20x4.scad>

width = 171;
module example1()
{
    union()
    {
        difference()
        {
            bbs_panel(3);
            union()
            {
                for(a = [1:8])
                {
                    y = a*(width - 20)/8;
                    translate([10, y, -0.1]) bbs_spdt_switch_cutout(2.2);
                    translate([25, y, -0.1]) bbs_led_cutout(5, 2.2);
                }
                translate([40, 30, -0.1]) rotate([0, 0, 90]) bbs_d_cutout(1, 2.2);
                translate([40, 70, -0.1]) rotate([0, 0, 90]) bbs_d_cutout(2, 2.2);
                translate([40, 120, -0.1]) rotate([0, 0, 90]) bbs_d_cutout(3, 2.2);
            }
        }
        for(a = [1:8])
        {
            y = a*(width - 20)/8;
            translate([25, y, 0]) bbs_led_mount(5, 2);
            translate([17, y, 1.9]) linear_extrude(height = 0.3) rotate([0, 0, -90])
                text(str(a), halign="center", valign="center", size=5);
        }
        translate([50, 30, 1.9]) linear_extrude(height = 0.3) rotate([0, 0, -90])
            text("9/15 pin", halign="center", valign="center", size=5);
        translate([50, 70, 1.9]) linear_extrude(height = 0.3) rotate([0, 0, -90])
            text("15/26 pin", halign="center", valign="center", size=5);
        translate([50, 120, 1.9]) linear_extrude(height = 0.3) rotate([0, 0, -90])
            text("25/44 pin", halign="center", valign="center", size=5);
    }
}

module example2()
{
    difference()
    {
        bbs_panel(3);
        union()
        {
            translate([60, 55, -0.1]) rotate([0, 0, 90]) bbs_20x4_lcd_cutouts(2.2, 20);
            translate([30, 20, -0.1]) rotate([0, 0, 00]) bbs_d_cutout(1, 2.2);
            translate([30, 40, -0.1]) rotate([0, 0, 0]) bbs_d_cutout(3, 2.2);
        }
    }
}

//example1();
example2();
